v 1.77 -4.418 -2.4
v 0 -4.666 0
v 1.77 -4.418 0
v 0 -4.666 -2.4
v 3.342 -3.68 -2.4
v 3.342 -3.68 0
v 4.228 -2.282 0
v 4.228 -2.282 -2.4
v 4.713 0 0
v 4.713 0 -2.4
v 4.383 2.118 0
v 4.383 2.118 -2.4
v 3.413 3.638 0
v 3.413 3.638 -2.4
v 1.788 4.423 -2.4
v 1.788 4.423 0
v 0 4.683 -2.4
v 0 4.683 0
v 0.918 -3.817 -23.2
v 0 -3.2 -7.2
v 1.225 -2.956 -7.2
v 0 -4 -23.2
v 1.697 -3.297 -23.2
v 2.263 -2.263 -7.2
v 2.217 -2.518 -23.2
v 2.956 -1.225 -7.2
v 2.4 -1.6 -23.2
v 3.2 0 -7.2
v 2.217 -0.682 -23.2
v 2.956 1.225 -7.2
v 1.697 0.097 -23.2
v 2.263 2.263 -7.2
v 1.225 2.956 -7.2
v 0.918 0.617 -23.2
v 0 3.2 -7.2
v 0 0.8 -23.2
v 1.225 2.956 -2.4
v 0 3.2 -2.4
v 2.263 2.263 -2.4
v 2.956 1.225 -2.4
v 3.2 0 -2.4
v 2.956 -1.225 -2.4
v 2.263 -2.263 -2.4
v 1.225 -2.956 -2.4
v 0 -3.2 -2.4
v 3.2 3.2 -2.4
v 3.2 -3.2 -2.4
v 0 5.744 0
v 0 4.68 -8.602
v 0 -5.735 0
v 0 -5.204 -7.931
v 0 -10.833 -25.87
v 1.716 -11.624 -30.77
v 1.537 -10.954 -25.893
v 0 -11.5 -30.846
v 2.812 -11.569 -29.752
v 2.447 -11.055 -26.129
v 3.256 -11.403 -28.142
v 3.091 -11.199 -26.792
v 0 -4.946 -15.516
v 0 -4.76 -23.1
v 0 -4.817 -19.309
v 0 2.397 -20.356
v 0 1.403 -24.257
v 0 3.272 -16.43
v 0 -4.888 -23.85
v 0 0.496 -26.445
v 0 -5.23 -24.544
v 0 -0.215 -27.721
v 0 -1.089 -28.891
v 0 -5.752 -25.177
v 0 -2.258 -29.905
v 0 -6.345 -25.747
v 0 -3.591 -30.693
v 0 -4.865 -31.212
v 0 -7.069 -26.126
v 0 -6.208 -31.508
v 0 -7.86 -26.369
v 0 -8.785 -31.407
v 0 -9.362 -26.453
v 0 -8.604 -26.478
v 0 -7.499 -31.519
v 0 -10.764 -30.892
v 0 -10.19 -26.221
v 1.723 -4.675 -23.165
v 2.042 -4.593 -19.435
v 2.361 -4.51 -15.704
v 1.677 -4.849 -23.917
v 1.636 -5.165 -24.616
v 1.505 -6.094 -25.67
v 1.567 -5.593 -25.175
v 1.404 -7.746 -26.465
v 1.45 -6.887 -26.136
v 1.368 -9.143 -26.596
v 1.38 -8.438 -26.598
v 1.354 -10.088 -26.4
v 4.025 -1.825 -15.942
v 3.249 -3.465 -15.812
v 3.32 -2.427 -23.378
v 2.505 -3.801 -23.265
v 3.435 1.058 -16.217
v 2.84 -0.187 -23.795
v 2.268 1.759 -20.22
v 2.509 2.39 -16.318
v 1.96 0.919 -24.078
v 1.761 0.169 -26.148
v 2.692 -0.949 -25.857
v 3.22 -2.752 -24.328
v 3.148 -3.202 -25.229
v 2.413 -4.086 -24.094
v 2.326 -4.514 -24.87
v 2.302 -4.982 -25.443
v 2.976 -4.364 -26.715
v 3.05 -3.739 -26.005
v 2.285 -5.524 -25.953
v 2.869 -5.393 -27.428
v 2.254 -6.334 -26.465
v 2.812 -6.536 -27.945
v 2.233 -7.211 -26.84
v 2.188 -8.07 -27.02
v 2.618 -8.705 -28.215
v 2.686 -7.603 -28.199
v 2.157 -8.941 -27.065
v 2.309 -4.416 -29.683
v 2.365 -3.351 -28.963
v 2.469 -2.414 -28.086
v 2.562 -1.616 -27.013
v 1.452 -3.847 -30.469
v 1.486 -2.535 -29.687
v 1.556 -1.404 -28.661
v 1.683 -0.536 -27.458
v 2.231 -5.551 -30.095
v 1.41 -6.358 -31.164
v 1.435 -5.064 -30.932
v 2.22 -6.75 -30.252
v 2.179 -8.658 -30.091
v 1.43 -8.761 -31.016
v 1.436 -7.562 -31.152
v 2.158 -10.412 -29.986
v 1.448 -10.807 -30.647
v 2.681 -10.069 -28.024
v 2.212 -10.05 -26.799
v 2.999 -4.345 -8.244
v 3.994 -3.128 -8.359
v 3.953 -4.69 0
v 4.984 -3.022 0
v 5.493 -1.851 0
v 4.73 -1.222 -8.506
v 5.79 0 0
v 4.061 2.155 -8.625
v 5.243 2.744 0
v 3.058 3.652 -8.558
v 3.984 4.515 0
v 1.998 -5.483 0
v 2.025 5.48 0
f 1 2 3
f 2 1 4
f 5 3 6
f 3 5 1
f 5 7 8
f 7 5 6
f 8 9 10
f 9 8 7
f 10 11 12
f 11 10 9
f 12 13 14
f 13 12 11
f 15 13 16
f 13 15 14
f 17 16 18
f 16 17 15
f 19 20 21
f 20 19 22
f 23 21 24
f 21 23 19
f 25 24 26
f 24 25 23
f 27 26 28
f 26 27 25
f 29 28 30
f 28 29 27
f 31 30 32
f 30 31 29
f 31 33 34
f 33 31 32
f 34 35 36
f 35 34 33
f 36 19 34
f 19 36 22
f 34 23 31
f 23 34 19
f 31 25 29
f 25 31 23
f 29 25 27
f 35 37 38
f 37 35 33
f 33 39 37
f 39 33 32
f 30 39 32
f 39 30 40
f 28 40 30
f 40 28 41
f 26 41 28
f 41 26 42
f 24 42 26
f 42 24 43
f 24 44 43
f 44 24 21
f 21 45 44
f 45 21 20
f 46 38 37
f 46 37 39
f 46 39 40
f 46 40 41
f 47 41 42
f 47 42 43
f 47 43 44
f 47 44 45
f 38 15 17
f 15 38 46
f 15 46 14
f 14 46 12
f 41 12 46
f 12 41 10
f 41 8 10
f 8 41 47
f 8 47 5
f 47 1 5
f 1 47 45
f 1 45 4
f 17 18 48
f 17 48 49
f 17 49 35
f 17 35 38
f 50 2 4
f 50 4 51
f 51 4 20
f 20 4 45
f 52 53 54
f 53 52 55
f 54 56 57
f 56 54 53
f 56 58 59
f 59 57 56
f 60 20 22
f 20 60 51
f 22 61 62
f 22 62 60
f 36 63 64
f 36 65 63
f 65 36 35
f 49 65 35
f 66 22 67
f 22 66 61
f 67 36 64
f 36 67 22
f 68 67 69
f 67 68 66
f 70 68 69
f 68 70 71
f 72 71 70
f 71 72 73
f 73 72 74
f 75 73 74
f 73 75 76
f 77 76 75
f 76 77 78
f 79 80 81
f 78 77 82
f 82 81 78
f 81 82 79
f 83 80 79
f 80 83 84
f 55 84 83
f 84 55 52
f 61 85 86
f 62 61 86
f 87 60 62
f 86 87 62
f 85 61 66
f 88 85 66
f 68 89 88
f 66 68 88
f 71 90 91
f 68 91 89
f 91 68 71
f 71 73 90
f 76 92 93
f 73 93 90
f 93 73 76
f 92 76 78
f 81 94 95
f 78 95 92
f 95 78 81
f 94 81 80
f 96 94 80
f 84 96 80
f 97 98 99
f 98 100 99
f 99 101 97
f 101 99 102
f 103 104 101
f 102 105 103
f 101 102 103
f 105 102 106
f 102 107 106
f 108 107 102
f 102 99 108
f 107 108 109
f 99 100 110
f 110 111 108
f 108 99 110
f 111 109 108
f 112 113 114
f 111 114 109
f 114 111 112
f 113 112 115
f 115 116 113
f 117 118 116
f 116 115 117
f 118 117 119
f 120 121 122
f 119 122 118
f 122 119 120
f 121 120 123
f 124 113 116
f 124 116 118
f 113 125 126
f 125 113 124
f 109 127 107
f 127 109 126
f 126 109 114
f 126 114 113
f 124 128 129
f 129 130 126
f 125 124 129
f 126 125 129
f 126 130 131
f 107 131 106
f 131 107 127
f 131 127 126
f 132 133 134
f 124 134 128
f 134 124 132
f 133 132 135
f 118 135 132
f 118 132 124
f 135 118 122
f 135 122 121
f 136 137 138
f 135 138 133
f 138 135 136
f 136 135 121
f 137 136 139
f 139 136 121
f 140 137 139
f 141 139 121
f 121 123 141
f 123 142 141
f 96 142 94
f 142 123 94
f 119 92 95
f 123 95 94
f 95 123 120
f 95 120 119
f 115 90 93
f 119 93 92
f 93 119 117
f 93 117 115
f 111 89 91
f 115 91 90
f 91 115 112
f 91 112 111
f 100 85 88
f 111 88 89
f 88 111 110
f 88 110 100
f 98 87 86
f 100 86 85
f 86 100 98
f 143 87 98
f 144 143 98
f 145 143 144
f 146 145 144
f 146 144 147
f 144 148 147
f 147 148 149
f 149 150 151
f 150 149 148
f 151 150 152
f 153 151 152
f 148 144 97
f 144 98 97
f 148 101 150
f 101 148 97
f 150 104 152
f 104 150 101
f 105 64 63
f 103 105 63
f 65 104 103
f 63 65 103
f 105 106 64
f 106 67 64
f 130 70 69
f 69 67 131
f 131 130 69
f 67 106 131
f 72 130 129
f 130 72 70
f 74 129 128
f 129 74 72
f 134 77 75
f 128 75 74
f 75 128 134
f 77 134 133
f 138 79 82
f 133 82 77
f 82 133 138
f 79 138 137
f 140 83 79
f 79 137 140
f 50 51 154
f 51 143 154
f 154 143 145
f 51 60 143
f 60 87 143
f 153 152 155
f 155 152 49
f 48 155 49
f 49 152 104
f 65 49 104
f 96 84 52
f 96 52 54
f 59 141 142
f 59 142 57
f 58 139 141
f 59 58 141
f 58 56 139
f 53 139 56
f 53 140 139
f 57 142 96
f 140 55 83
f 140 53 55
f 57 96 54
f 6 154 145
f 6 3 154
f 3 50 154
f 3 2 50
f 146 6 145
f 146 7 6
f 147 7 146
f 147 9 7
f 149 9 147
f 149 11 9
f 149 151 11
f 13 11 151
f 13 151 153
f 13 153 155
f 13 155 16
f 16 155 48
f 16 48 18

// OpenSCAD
use <../lib.scad>
use <../p/2-4chrd.scad>
use <../p/2-4con3.scad>
use <../p/2-4cyli.scad>
use <../p/2-4edge.scad>
use <../p/2-4ndis.scad>
use <s/34987s01.scad>
function ldraw_lib__u9649() = [
// 0 ~Animal Trunk Left
// 0 Name: u9649.dat
// 0 Author: Gerald Lasser [GeraldLasser]
// 0 !LDRAW_ORG Part UPDATE 2024-10
// 0 !LICENSE Licensed under CC BY 4.0 : see CAreadme.txt
// 
// 0 BFC CERTIFY CCW
  [0,"BFC","CERTIFY"],
  [0,"BFC","CCW"],
// 
// 0 !KEYWORDS elephant, Mammoth
// 
// 0 !HISTORY 2024-11-24 {LEGO Instructions App} Original part shape
// 0 !HISTORY 2024-11-24 [GeraldLasser] File preparation for LDraw Parts Tracker
// 0 !HISTORY 2024-12-01 [OrionP] Official Update 2024-10
// 
// 4 16 0 6 -11.665 0 0 -11.665 4.426 0 -11.045 4.426 6 -11.045
  [4,16,0,6,-11.665,0,0,-11.665,4.426,0,-11.045,4.426,6,-11.045],
// 4 16 4.426 6 -11.045 4.426 0 -11.045 8.356 0 -9.199 8.356 6 -9.199
  [4,16,4.426,6,-11.045,4.426,0,-11.045,8.356,0,-9.199,8.356,6,-9.199],
// 4 16 8.356 6 -9.199 8.356 0 -9.199 10.57 0 -5.705 10.57 6 -5.705
  [4,16,8.356,6,-9.199,8.356,0,-9.199,10.57,0,-5.705,10.57,6,-5.705],
// 4 16 10.57 6 -5.705 10.57 0 -5.705 11.782 0 0 11.782 6 0
  [4,16,10.57,6,-5.705,10.57,0,-5.705,11.782,0,0,11.782,6,0],
// 4 16 11.782 6 0 11.782 0 0 10.958 0 5.294 10.958 6 5.294
  [4,16,11.782,6,0,11.782,0,0,10.958,0,5.294,10.958,6,5.294],
// 4 16 10.958 6 5.294 10.958 0 5.294 8.533 0 9.096 8.533 6 9.096
  [4,16,10.958,6,5.294,10.958,0,5.294,8.533,0,9.096,8.533,6,9.096],
// 4 16 8.533 6 9.096 8.533 0 9.096 4.469 0 11.058 4.469 6 11.058
  [4,16,8.533,6,9.096,8.533,0,9.096,4.469,0,11.058,4.469,6,11.058],
// 4 16 4.469 6 11.058 4.469 0 11.058 0 0 11.707 0 6 11.707
  [4,16,4.469,6,11.058,4.469,0,11.058,0,0,11.707,0,6,11.707],
// 2 24 0 6 11.707 0 0 11.707
  [2,24,0,6,11.707,0,0,11.707],
// 2 24 0 6 -11.665 0 0 -11.665
  [2,24,0,6,-11.665,0,0,-11.665],
// 5 24 4.426 0 -11.045 4.426 6 -11.045 0 0 -11.665 8.356 6 -9.199
  [5,24,4.426,0,-11.045,4.426,6,-11.045,0,0,-11.665,8.356,6,-9.199],
// 5 24 10.57 0 -5.705 10.57 6 -5.705 8.356 0 -9.199 11.782 6 0
  [5,24,10.57,0,-5.705,10.57,6,-5.705,8.356,0,-9.199,11.782,6,0],
// 5 24 4.469 0 11.058 4.469 6 11.058 8.533 0 9.096 0 6 11.707
  [5,24,4.469,0,11.058,4.469,6,11.058,8.533,0,9.096,0,6,11.707],
// 5 24 8.533 0 9.096 8.533 6 9.096 10.958 0 5.294 4.469 6 11.058
  [5,24,8.533,0,9.096,8.533,6,9.096,10.958,0,5.294,4.469,6,11.058],
// 5 24 11.782 6 0 11.782 0 0 10.57 0 -5.705 10.958 6 5.294
  [5,24,11.782,6,0,11.782,0,0,10.57,0,-5.705,10.958,6,5.294],
// 5 24 10.958 0 5.294 10.958 6 5.294 11.782 0 0 8.533 6 9.096
  [5,24,10.958,0,5.294,10.958,6,5.294,11.782,0,0,8.533,6,9.096],
// 5 24 8.356 0 -9.199 8.356 6 -9.199 4.426 0 -11.045 10.57 6 -5.705
  [5,24,8.356,0,-9.199,8.356,6,-9.199,4.426,0,-11.045,10.57,6,-5.705],
// 0 BFC INVERTNEXT
  [0,"BFC","INVERTNEXT"],
// 1 16 0 18 0 0 0 2 0 40 0 -2 -4 0 2-4con3.dat
  [1,16,0,18,0,0,0,2,0,40,0,-2,-4,0, ldraw_lib__2_4con3()],
// 1 16 0 58 -4 0 0 6 0 1 0 6 0 0 2-4chrd.dat
  [1,16,0,58,-4,0,0,6,0,1,0,6,0,0, ldraw_lib__2_4chrd()],
// 1 16 0 58 -4 0 0 6 0 1 0 6 0 0 2-4edge.dat
  [1,16,0,58,-4,0,0,6,0,1,0,6,0,0, ldraw_lib__2_4edge()],
// 0 BFC INVERTNEXT
  [0,"BFC","INVERTNEXT"],
// 1 16 0 18 0 0 0 8 0 -12 0 8 0 0 2-4cyli.dat
  [1,16,0,18,0,0,0,8,0,-12,0,8,0,0, ldraw_lib__2_4cyli()],
// 1 16 0 6 0 0 0 8 0 1 0 8 0 0 2-4ndis.dat
  [1,16,0,6,0,0,0,8,0,1,0,8,0,0, ldraw_lib__2_4ndis()],
// 1 16 0 6 0 0 0 8 0 1 0 8 0 0 2-4edge.dat
  [1,16,0,6,0,0,0,8,0,1,0,8,0,0, ldraw_lib__2_4edge()],
// 5 24 0 18 8 3.0616 18 7.3912 0 58 2 0 6 8
  [5,24,0,18,8,3.0616,18,7.3912,0,58,2,0,6,8],
// 5 24 3.0616 18 7.3912 5.6568 18 5.6568 2.2962 58 1.5434 3.0616 6 7.3912
  [5,24,3.0616,18,7.3912,5.6568,18,5.6568,2.2962,58,1.5434,3.0616,6,7.3912],
// 5 24 5.6568 18 5.6568 7.3912 18 3.0616 5.6568 6 5.6568 4.2426 58 .2426
  [5,24,5.6568,18,5.6568,7.3912,18,3.0616,5.6568,6,5.6568,4.2426,58,.2426],
// 5 24 7.3912 18 3.0616 8 18 0 7.3912 6 3.0616 5.5434 58 -1.7038
  [5,24,7.3912,18,3.0616,8,18,0,7.3912,6,3.0616,5.5434,58,-1.7038],
// 5 24 8 18 0 7.3912 18 -3.0616 5.5434 58 -6.2962 7.3912 6 -3.0616
  [5,24,8,18,0,7.3912,18,-3.0616,5.5434,58,-6.2962,7.3912,6,-3.0616],
// 5 24 7.3912 18 -3.0616 5.6568 18 -5.6568 4.2426 58 -8.2426 5.6568 6 -5.6568
  [5,24,7.3912,18,-3.0616,5.6568,18,-5.6568,4.2426,58,-8.2426,5.6568,6,-5.6568],
// 5 24 5.6568 18 -5.6568 3.0616 18 -7.3912 2.2962 58 -9.5434 3.0616 6 -7.3912
  [5,24,5.6568,18,-5.6568,3.0616,18,-7.3912,2.2962,58,-9.5434,3.0616,6,-7.3912],
// 5 24 3.0616 18 -7.3912 0 18 -8 0 6 -8 0 58 -10
  [5,24,3.0616,18,-7.3912,0,18,-8,0,6,-8,0,58,-10],
// 
// 4 16 8 6 8 4.469 6 11.058 0 6 11.707 0 6 8
  [4,16,8,6,8,4.469,6,11.058,0,6,11.707,0,6,8],
// 3 16 4.469 6 11.058 8 6 8 8.533 6 9.096
  [3,16,4.469,6,11.058,8,6,8,8.533,6,9.096],
// 3 16 8.533 6 9.096 8 6 8 10.958 6 5.294
  [3,16,8.533,6,9.096,8,6,8,10.958,6,5.294],
// 4 16 8 6 8 8 6 0 11.782 6 0 10.958 6 5.294
  [4,16,8,6,8,8,6,0,11.782,6,0,10.958,6,5.294],
// 4 16 11.782 6 0 8 6 0 8 6 -8 10.57 6 -5.705
  [4,16,11.782,6,0,8,6,0,8,6,-8,10.57,6,-5.705],
// 3 16 10.57 6 -5.705 8 6 -8 8.356 6 -9.199
  [3,16,10.57,6,-5.705,8,6,-8,8.356,6,-9.199],
// 4 16 8.356 6 -9.199 8 6 -8 0 6 -8 4.426 6 -11.045
  [4,16,8.356,6,-9.199,8,6,-8,0,6,-8,4.426,6,-11.045],
// 3 16 4.426 6 -11.045 0 6 -8 0 6 -11.665
  [3,16,4.426,6,-11.045,0,6,-8,0,6,-11.665],
// 2 24 0 6 -11.665 4.426 6 -11.045
  [2,24,0,6,-11.665,4.426,6,-11.045],
// 2 24 4.426 6 -11.045 8.356 6 -9.199
  [2,24,4.426,6,-11.045,8.356,6,-9.199],
// 2 24 8.356 6 -9.199 10.57 6 -5.705
  [2,24,8.356,6,-9.199,10.57,6,-5.705],
// 2 24 10.57 6 -5.705 11.782 6 0
  [2,24,10.57,6,-5.705,11.782,6,0],
// 2 24 11.782 6 0 10.958 6 5.294
  [2,24,11.782,6,0,10.958,6,5.294],
// 2 24 10.958 6 5.294 8.533 6 9.096
  [2,24,10.958,6,5.294,8.533,6,9.096],
// 2 24 8.533 6 9.096 4.469 6 11.058
  [2,24,8.533,6,9.096,4.469,6,11.058],
// 2 24 4.469 6 11.058 0 6 11.707
  [2,24,4.469,6,11.058,0,6,11.707],
// 2 24 0 6 11.707 0 6 8
  [2,24,0,6,11.707,0,6,8],
// 2 24 0 6 -11.665 0 6 -8
  [2,24,0,6,-11.665,0,6,-8],
// 2 24 0 6 -8 0 18 -8
  [2,24,0,6,-8,0,18,-8],
// 2 24 0 18 -8 0 58 -10
  [2,24,0,18,-8,0,58,-10],
// 2 24 0 58 -10 0 58 2
  [2,24,0,58,-10,0,58,2],
// 2 24 0 58 2 0 18 8
  [2,24,0,58,2,0,18,8],
// 2 24 0 18 8 0 6 8
  [2,24,0,18,8,0,6,8],
// 
// 3 16 0 6 11.707 0 0 11.707 0 0 14.361
  [3,16,0,6,11.707,0,0,11.707,0,0,14.361],
// 3 16 0 6 11.707 0 0 14.361 0 21.506 11.701
  [3,16,0,6,11.707,0,0,14.361,0,21.506,11.701],
// 3 16 0 6 11.707 0 21.506 11.701 0 18 8
  [3,16,0,6,11.707,0,21.506,11.701,0,18,8],
// 3 16 0 6 11.707 0 18 8 0 6 8
  [3,16,0,6,11.707,0,18,8,0,6,8],
// 3 16 0 0 -14.337 0 0 -11.665 0 6 -11.665
  [3,16,0,0,-14.337,0,0,-11.665,0,6,-11.665],
// 3 16 0 0 -14.337 0 6 -11.665 0 19.828 -13.009
  [3,16,0,0,-14.337,0,6,-11.665,0,19.828,-13.009],
// 3 16 0 19.828 -13.009 0 6 -11.665 0 18 -8
  [3,16,0,19.828,-13.009,0,6,-11.665,0,18,-8],
// 3 16 0 18 -8 0 6 -11.665 0 6 -8
  [3,16,0,18,-8,0,6,-11.665,0,6,-8],
// 4 16 3.843 64.733 -27.385 0 64.674 -27.082 0 77.115 -28.75 4.289 76.926 -29.06
  [4,16,3.843,64.733,-27.385,0,64.674,-27.082,0,77.115,-28.75,4.289,76.926,-29.06],
// 4 16 3.843 64.733 -27.385 4.289 76.926 -29.06 7.029 74.38 -28.922 6.117 65.323 -27.637
  [4,16,3.843,64.733,-27.385,4.289,76.926,-29.06,7.029,74.38,-28.922,6.117,65.323,-27.637],
// 3 16 7.029 74.38 -28.922 8.139 70.354 -28.508 7.728 66.98 -27.998
  [3,16,7.029,74.38,-28.922,8.139,70.354,-28.508,7.728,66.98,-27.998],
// 3 16 7.728 66.98 -27.998 6.117 65.323 -27.637 7.029 74.38 -28.922
  [3,16,7.728,66.98,-27.998,6.117,65.323,-27.637,7.029,74.38,-28.922],
// 5 24 6.117 65.323 -27.637 7.029 74.38 -28.922 3.843 64.733 -27.385 7.728 66.98 -27.998
  [5,24,6.117,65.323,-27.637,7.029,74.38,-28.922,3.843,64.733,-27.385,7.728,66.98,-27.998],
// 5 24 4.289 76.926 -29.06 3.843 64.733 -27.385 0 64.674 -27.082 7.029 74.38 -28.922
  [5,24,4.289,76.926,-29.06,3.843,64.733,-27.385,0,64.674,-27.082,7.029,74.38,-28.922],
// 5 24 7.728 66.98 -27.998 7.029 74.38 -28.922 8.139 70.354 -28.508 6.117 65.323 -27.637
  [5,24,7.728,66.98,-27.998,7.029,74.38,-28.922,8.139,70.354,-28.508,6.117,65.323,-27.637],
// 2 24 0 64.674 -27.082 0 77.115 -28.75
  [2,24,0,64.674,-27.082,0,77.115,-28.75],
// 
// 1 16 0 0 0 -1 0 0 0 1 0 0 0 1 s\34987s01.dat
  [1,16,0,0,0,-1,0,0,0,1,0,0,0,1, ldraw_lib__s__34987s01()],
// 
// 3 16 3.385 65.999 -25.221 0 65.552 -25.474 0 64.674 -27.082
  [3,16,3.385,65.999,-25.221,0,65.552,-25.474,0,64.674,-27.082],
// 3 16 3.385 65.999 -25.221 0 64.674 -27.082 3.843 64.733 -27.385
  [3,16,3.385,65.999,-25.221,0,64.674,-27.082,3.843,64.733,-27.385],
// 3 16 7.728 66.98 -27.998 6.703 70.06 -25.173 5.531 66.997 -25.124
  [3,16,7.728,66.98,-27.998,6.703,70.06,-25.173,5.531,66.997,-25.124],
// 3 16 7.728 66.98 -27.998 5.531 66.997 -25.124 6.117 65.323 -27.637
  [3,16,7.728,66.98,-27.998,5.531,66.997,-25.124,6.117,65.323,-27.637],
// 3 16 8.139 70.354 -28.508 5.394 74.965 -26.029 6.703 70.06 -25.173
  [3,16,8.139,70.354,-28.508,5.394,74.965,-26.029,6.703,70.06,-25.173],
// 3 16 7.728 66.98 -27.998 8.139 70.354 -28.508 6.703 70.06 -25.173
  [3,16,7.728,66.98,-27.998,8.139,70.354,-28.508,6.703,70.06,-25.173],
// 3 16 8.139 70.354 -28.508 7.029 74.38 -28.922 5.394 74.965 -26.029
  [3,16,8.139,70.354,-28.508,7.029,74.38,-28.922,5.394,74.965,-26.029],
// 3 16 4.289 76.926 -29.06 5.394 74.965 -26.029 7.029 74.38 -28.922
  [3,16,4.289,76.926,-29.06,5.394,74.965,-26.029,7.029,74.38,-28.922],
// 3 16 4.289 76.926 -29.06 3.62 76.618 -27.017 5.394 74.965 -26.029
  [3,16,4.289,76.926,-29.06,3.62,76.618,-27.017,5.394,74.965,-26.029],
// 3 16 6.117 65.323 -27.637 5.531 66.997 -25.124 3.385 65.999 -25.221
  [3,16,6.117,65.323,-27.637,5.531,66.997,-25.124,3.385,65.999,-25.221],
// 3 16 3.62 76.618 -27.017 0 77.115 -28.75 0 77.229 -26.911
  [3,16,3.62,76.618,-27.017,0,77.115,-28.75,0,77.229,-26.911],
// 3 16 3.62 76.618 -27.017 4.289 76.926 -29.06 0 77.115 -28.75
  [3,16,3.62,76.618,-27.017,4.289,76.926,-29.06,0,77.115,-28.75],
// 3 16 6.117 65.323 -27.637 3.385 65.999 -25.221 3.843 64.733 -27.385
  [3,16,6.117,65.323,-27.637,3.385,65.999,-25.221,3.843,64.733,-27.385],
// 3 16 8.356 0 -9.199 4.994 0 -13.708 9.883 0 -11.725
  [3,16,8.356,0,-9.199,4.994,0,-13.708,9.883,0,-11.725],
// 3 16 8.356 0 -9.199 4.426 0 -11.045 4.994 0 -13.708
  [3,16,8.356,0,-9.199,4.426,0,-11.045,4.994,0,-13.708],
// 3 16 4.426 0 -11.045 0 0 -14.337 4.994 0 -13.708
  [3,16,4.426,0,-11.045,0,0,-14.337,4.994,0,-13.708],
// 3 16 4.426 0 -11.045 0 0 -11.665 0 0 -14.337
  [3,16,4.426,0,-11.045,0,0,-11.665,0,0,-14.337],
// 3 16 12.459 0 -7.556 8.356 0 -9.199 9.883 0 -11.725
  [3,16,12.459,0,-7.556,8.356,0,-9.199,9.883,0,-11.725],
// 3 16 12.459 0 -7.556 10.57 0 -5.705 8.356 0 -9.199
  [3,16,12.459,0,-7.556,10.57,0,-5.705,8.356,0,-9.199],
// 3 16 13.733 0 -4.627 10.57 0 -5.705 12.459 0 -7.556
  [3,16,13.733,0,-4.627,10.57,0,-5.705,12.459,0,-7.556],
// 3 16 13.733 0 -4.627 11.782 0 0 10.57 0 -5.705
  [3,16,13.733,0,-4.627,11.782,0,0,10.57,0,-5.705],
// 3 16 14.476 0 0 11.782 0 0 13.733 0 -4.627
  [3,16,14.476,0,0,11.782,0,0,13.733,0,-4.627],
// 3 16 14.476 0 0 10.958 0 5.294 11.782 0 0
  [3,16,14.476,0,0,10.958,0,5.294,11.782,0,0],
// 3 16 14.476 0 0 13.108 0 6.859 10.958 0 5.294
  [3,16,14.476,0,0,13.108,0,6.859,10.958,0,5.294],
// 3 16 8.533 0 9.096 10.958 0 5.294 13.108 0 6.859
  [3,16,8.533,0,9.096,10.958,0,5.294,13.108,0,6.859],
// 3 16 8.533 0 9.096 13.108 0 6.859 9.961 0 11.288
  [3,16,8.533,0,9.096,13.108,0,6.859,9.961,0,11.288],
// 3 16 8.533 0 9.096 9.961 0 11.288 5.063 0 13.7
  [3,16,8.533,0,9.096,9.961,0,11.288,5.063,0,13.7],
// 3 16 8.533 0 9.096 5.063 0 13.7 4.469 0 11.058
  [3,16,8.533,0,9.096,5.063,0,13.7,4.469,0,11.058],
// 3 16 4.469 0 11.058 5.063 0 13.7 0 0 14.361
  [3,16,4.469,0,11.058,5.063,0,13.7,0,0,14.361],
// 3 16 4.469 0 11.058 0 0 14.361 0 0 11.707
  [3,16,4.469,0,11.058,0,0,14.361,0,0,11.707],
// 2 24 0 65.552 -25.474 0 64.674 -27.082
  [2,24,0,65.552,-25.474,0,64.674,-27.082],
// 5 24 0 64.674 -27.082 3.385 65.999 -25.221 0 65.552 -25.474 3.843 64.733 -27.385
  [5,24,0,64.674,-27.082,3.385,65.999,-25.221,0,65.552,-25.474,3.843,64.733,-27.385],
// 2 24 0 64.674 -27.082 3.843 64.733 -27.385
  [2,24,0,64.674,-27.082,3.843,64.733,-27.385],
// 5 24 3.843 64.733 -27.385 3.385 65.999 -25.221 6.117 65.323 -27.637 0 64.674 -27.082
  [5,24,3.843,64.733,-27.385,3.385,65.999,-25.221,6.117,65.323,-27.637,0,64.674,-27.082],
// 5 24 7.728 66.98 -27.998 6.703 70.06 -25.173 5.531 66.997 -25.124 8.139 70.354 -28.508
  [5,24,7.728,66.98,-27.998,6.703,70.06,-25.173,5.531,66.997,-25.124,8.139,70.354,-28.508],
// 5 24 5.531 66.997 -25.124 7.728 66.98 -27.998 6.703 70.06 -25.173 6.117 65.323 -27.637
  [5,24,5.531,66.997,-25.124,7.728,66.98,-27.998,6.703,70.06,-25.173,6.117,65.323,-27.637],
// 5 24 5.531 66.997 -25.124 6.117 65.323 -27.637 7.728 66.98 -27.998 3.385 65.999 -25.221
  [5,24,5.531,66.997,-25.124,6.117,65.323,-27.637,7.728,66.98,-27.998,3.385,65.999,-25.221],
// 2 24 6.117 65.323 -27.637 7.728 66.98 -27.998
  [2,24,6.117,65.323,-27.637,7.728,66.98,-27.998],
// 5 24 8.139 70.354 -28.508 5.394 74.965 -26.029 6.703 70.06 -25.173 7.029 74.38 -28.922
  [5,24,8.139,70.354,-28.508,5.394,74.965,-26.029,6.703,70.06,-25.173,7.029,74.38,-28.922],
// 5 24 6.703 70.06 -25.173 8.139 70.354 -28.508 5.394 74.965 -26.029 7.728 66.98 -27.998
  [5,24,6.703,70.06,-25.173,8.139,70.354,-28.508,5.394,74.965,-26.029,7.728,66.98,-27.998],
// 2 24 7.728 66.98 -27.998 8.139 70.354 -28.508
  [2,24,7.728,66.98,-27.998,8.139,70.354,-28.508],
// 2 24 8.139 70.354 -28.508 7.029 74.38 -28.922
  [2,24,8.139,70.354,-28.508,7.029,74.38,-28.922],
// 5 24 7.029 74.38 -28.922 5.394 74.965 -26.029 8.139 70.354 -28.508 4.289 76.926 -29.06
  [5,24,7.029,74.38,-28.922,5.394,74.965,-26.029,8.139,70.354,-28.508,4.289,76.926,-29.06],
// 2 24 7.029 74.38 -28.922 4.289 76.926 -29.06
  [2,24,7.029,74.38,-28.922,4.289,76.926,-29.06],
// 5 24 4.289 76.926 -29.06 3.62 76.618 -27.017 0 77.115 -28.75 5.394 74.965 -26.029
  [5,24,4.289,76.926,-29.06,3.62,76.618,-27.017,0,77.115,-28.75,5.394,74.965,-26.029],
// 5 24 3.385 65.999 -25.221 6.117 65.323 -27.637 5.531 66.997 -25.124 3.843 64.733 -27.385
  [5,24,3.385,65.999,-25.221,6.117,65.323,-27.637,5.531,66.997,-25.124,3.843,64.733,-27.385],
// 5 24 3.62 76.618 -27.017 0 77.115 -28.75 0 77.229 -26.911 4.289 76.926 -29.06
  [5,24,3.62,76.618,-27.017,0,77.115,-28.75,0,77.229,-26.911,4.289,76.926,-29.06],
// 2 24 0 77.115 -28.75 0 77.229 -26.911
  [2,24,0,77.115,-28.75,0,77.229,-26.911],
// 2 24 4.289 76.926 -29.06 0 77.115 -28.75
  [2,24,4.289,76.926,-29.06,0,77.115,-28.75],
// 2 24 3.843 64.733 -27.385 6.117 65.323 -27.637
  [2,24,3.843,64.733,-27.385,6.117,65.323,-27.637],
// 2 24 8.356 0 -9.199 4.426 0 -11.045
  [2,24,8.356,0,-9.199,4.426,0,-11.045],
// 2 24 4.426 0 -11.045 0 0 -11.665
  [2,24,4.426,0,-11.045,0,0,-11.665],
// 2 24 0 0 -11.665 0 0 -14.337
  [2,24,0,0,-11.665,0,0,-14.337],
// 2 24 10.57 0 -5.705 8.356 0 -9.199
  [2,24,10.57,0,-5.705,8.356,0,-9.199],
// 2 24 11.782 0 0 10.57 0 -5.705
  [2,24,11.782,0,0,10.57,0,-5.705],
// 2 24 10.958 0 5.294 11.782 0 0
  [2,24,10.958,0,5.294,11.782,0,0],
// 2 24 8.533 0 9.096 10.958 0 5.294
  [2,24,8.533,0,9.096,10.958,0,5.294],
// 2 24 4.469 0 11.058 8.533 0 9.096
  [2,24,4.469,0,11.058,8.533,0,9.096],
// 2 24 0 0 14.361 0 0 11.707
  [2,24,0,0,14.361,0,0,11.707],
// 2 24 0 0 11.707 4.469 0 11.058
  [2,24,0,0,11.707,4.469,0,11.058],
// 
// 5 24 4.289 76.926 -29.06 5.394 74.965 -26.029 7.029 74.38 -28.922 3.62 76.618 -27.017
  [5,24,4.289,76.926,-29.06,5.394,74.965,-26.029,7.029,74.38,-28.922,3.62,76.618,-27.017],
// 
// 5 24 3.385 65.999 -25.221 0 65.552 -25.474 0 66.133 -23.405 -3 67 -27
  [5,24,3.385,65.999,-25.221,0,65.552,-25.474,0,66.133,-23.405,-3,67,-27],
// 5 24 5.531 66.997 -25.124 3.385 65.999 -25.221 3.421 66.491 -22.857 3.843 64.733 -27.385
  [5,24,5.531,66.997,-25.124,3.385,65.999,-25.221,3.421,66.491,-22.857,3.843,64.733,-27.385],
// 5 24 3.62 76.618 -27.017 0 77.229 -26.911 3.574 77.54 -21.903 0 77.115 -28.75
  [5,24,3.62,76.618,-27.017,0,77.229,-26.911,3.574,77.54,-21.903,0,77.115,-28.75],
// 5 24 5.394 74.965 -26.029 6.703 70.06 -25.173 6.545 70.537 -21.763 8.139 70.354 -28.508
  [5,24,5.394,74.965,-26.029,6.703,70.06,-25.173,6.545,70.537,-21.763,8.139,70.354,-28.508],
// 5 24 6.703 70.06 -25.173 5.531 66.997 -25.124 5.393 67.663 -22.353 6.117 65.323 -27.637
  [5,24,6.703,70.06,-25.173,5.531,66.997,-25.124,5.393,67.663,-22.353,6.117,65.323,-27.637],
// 5 24 5.394 74.965 -26.029 3.62 76.618 -27.017 4.289 76.926 -29.06 3.574 77.54 -21.903
  [5,24,5.394,74.965,-26.029,3.62,76.618,-27.017,4.289,76.926,-29.06,3.574,77.54,-21.903],
];
module ldraw_lib__u9649(step=0, col=false, unit=2/5, alt=false, line=0.2, solid=!$preview)
    makepoly(ldraw_lib__u9649(), step=step, col=col, unit=unit, alt=alt, line=line, solid=solid);
ldraw_lib__u9649(line=0.2);
